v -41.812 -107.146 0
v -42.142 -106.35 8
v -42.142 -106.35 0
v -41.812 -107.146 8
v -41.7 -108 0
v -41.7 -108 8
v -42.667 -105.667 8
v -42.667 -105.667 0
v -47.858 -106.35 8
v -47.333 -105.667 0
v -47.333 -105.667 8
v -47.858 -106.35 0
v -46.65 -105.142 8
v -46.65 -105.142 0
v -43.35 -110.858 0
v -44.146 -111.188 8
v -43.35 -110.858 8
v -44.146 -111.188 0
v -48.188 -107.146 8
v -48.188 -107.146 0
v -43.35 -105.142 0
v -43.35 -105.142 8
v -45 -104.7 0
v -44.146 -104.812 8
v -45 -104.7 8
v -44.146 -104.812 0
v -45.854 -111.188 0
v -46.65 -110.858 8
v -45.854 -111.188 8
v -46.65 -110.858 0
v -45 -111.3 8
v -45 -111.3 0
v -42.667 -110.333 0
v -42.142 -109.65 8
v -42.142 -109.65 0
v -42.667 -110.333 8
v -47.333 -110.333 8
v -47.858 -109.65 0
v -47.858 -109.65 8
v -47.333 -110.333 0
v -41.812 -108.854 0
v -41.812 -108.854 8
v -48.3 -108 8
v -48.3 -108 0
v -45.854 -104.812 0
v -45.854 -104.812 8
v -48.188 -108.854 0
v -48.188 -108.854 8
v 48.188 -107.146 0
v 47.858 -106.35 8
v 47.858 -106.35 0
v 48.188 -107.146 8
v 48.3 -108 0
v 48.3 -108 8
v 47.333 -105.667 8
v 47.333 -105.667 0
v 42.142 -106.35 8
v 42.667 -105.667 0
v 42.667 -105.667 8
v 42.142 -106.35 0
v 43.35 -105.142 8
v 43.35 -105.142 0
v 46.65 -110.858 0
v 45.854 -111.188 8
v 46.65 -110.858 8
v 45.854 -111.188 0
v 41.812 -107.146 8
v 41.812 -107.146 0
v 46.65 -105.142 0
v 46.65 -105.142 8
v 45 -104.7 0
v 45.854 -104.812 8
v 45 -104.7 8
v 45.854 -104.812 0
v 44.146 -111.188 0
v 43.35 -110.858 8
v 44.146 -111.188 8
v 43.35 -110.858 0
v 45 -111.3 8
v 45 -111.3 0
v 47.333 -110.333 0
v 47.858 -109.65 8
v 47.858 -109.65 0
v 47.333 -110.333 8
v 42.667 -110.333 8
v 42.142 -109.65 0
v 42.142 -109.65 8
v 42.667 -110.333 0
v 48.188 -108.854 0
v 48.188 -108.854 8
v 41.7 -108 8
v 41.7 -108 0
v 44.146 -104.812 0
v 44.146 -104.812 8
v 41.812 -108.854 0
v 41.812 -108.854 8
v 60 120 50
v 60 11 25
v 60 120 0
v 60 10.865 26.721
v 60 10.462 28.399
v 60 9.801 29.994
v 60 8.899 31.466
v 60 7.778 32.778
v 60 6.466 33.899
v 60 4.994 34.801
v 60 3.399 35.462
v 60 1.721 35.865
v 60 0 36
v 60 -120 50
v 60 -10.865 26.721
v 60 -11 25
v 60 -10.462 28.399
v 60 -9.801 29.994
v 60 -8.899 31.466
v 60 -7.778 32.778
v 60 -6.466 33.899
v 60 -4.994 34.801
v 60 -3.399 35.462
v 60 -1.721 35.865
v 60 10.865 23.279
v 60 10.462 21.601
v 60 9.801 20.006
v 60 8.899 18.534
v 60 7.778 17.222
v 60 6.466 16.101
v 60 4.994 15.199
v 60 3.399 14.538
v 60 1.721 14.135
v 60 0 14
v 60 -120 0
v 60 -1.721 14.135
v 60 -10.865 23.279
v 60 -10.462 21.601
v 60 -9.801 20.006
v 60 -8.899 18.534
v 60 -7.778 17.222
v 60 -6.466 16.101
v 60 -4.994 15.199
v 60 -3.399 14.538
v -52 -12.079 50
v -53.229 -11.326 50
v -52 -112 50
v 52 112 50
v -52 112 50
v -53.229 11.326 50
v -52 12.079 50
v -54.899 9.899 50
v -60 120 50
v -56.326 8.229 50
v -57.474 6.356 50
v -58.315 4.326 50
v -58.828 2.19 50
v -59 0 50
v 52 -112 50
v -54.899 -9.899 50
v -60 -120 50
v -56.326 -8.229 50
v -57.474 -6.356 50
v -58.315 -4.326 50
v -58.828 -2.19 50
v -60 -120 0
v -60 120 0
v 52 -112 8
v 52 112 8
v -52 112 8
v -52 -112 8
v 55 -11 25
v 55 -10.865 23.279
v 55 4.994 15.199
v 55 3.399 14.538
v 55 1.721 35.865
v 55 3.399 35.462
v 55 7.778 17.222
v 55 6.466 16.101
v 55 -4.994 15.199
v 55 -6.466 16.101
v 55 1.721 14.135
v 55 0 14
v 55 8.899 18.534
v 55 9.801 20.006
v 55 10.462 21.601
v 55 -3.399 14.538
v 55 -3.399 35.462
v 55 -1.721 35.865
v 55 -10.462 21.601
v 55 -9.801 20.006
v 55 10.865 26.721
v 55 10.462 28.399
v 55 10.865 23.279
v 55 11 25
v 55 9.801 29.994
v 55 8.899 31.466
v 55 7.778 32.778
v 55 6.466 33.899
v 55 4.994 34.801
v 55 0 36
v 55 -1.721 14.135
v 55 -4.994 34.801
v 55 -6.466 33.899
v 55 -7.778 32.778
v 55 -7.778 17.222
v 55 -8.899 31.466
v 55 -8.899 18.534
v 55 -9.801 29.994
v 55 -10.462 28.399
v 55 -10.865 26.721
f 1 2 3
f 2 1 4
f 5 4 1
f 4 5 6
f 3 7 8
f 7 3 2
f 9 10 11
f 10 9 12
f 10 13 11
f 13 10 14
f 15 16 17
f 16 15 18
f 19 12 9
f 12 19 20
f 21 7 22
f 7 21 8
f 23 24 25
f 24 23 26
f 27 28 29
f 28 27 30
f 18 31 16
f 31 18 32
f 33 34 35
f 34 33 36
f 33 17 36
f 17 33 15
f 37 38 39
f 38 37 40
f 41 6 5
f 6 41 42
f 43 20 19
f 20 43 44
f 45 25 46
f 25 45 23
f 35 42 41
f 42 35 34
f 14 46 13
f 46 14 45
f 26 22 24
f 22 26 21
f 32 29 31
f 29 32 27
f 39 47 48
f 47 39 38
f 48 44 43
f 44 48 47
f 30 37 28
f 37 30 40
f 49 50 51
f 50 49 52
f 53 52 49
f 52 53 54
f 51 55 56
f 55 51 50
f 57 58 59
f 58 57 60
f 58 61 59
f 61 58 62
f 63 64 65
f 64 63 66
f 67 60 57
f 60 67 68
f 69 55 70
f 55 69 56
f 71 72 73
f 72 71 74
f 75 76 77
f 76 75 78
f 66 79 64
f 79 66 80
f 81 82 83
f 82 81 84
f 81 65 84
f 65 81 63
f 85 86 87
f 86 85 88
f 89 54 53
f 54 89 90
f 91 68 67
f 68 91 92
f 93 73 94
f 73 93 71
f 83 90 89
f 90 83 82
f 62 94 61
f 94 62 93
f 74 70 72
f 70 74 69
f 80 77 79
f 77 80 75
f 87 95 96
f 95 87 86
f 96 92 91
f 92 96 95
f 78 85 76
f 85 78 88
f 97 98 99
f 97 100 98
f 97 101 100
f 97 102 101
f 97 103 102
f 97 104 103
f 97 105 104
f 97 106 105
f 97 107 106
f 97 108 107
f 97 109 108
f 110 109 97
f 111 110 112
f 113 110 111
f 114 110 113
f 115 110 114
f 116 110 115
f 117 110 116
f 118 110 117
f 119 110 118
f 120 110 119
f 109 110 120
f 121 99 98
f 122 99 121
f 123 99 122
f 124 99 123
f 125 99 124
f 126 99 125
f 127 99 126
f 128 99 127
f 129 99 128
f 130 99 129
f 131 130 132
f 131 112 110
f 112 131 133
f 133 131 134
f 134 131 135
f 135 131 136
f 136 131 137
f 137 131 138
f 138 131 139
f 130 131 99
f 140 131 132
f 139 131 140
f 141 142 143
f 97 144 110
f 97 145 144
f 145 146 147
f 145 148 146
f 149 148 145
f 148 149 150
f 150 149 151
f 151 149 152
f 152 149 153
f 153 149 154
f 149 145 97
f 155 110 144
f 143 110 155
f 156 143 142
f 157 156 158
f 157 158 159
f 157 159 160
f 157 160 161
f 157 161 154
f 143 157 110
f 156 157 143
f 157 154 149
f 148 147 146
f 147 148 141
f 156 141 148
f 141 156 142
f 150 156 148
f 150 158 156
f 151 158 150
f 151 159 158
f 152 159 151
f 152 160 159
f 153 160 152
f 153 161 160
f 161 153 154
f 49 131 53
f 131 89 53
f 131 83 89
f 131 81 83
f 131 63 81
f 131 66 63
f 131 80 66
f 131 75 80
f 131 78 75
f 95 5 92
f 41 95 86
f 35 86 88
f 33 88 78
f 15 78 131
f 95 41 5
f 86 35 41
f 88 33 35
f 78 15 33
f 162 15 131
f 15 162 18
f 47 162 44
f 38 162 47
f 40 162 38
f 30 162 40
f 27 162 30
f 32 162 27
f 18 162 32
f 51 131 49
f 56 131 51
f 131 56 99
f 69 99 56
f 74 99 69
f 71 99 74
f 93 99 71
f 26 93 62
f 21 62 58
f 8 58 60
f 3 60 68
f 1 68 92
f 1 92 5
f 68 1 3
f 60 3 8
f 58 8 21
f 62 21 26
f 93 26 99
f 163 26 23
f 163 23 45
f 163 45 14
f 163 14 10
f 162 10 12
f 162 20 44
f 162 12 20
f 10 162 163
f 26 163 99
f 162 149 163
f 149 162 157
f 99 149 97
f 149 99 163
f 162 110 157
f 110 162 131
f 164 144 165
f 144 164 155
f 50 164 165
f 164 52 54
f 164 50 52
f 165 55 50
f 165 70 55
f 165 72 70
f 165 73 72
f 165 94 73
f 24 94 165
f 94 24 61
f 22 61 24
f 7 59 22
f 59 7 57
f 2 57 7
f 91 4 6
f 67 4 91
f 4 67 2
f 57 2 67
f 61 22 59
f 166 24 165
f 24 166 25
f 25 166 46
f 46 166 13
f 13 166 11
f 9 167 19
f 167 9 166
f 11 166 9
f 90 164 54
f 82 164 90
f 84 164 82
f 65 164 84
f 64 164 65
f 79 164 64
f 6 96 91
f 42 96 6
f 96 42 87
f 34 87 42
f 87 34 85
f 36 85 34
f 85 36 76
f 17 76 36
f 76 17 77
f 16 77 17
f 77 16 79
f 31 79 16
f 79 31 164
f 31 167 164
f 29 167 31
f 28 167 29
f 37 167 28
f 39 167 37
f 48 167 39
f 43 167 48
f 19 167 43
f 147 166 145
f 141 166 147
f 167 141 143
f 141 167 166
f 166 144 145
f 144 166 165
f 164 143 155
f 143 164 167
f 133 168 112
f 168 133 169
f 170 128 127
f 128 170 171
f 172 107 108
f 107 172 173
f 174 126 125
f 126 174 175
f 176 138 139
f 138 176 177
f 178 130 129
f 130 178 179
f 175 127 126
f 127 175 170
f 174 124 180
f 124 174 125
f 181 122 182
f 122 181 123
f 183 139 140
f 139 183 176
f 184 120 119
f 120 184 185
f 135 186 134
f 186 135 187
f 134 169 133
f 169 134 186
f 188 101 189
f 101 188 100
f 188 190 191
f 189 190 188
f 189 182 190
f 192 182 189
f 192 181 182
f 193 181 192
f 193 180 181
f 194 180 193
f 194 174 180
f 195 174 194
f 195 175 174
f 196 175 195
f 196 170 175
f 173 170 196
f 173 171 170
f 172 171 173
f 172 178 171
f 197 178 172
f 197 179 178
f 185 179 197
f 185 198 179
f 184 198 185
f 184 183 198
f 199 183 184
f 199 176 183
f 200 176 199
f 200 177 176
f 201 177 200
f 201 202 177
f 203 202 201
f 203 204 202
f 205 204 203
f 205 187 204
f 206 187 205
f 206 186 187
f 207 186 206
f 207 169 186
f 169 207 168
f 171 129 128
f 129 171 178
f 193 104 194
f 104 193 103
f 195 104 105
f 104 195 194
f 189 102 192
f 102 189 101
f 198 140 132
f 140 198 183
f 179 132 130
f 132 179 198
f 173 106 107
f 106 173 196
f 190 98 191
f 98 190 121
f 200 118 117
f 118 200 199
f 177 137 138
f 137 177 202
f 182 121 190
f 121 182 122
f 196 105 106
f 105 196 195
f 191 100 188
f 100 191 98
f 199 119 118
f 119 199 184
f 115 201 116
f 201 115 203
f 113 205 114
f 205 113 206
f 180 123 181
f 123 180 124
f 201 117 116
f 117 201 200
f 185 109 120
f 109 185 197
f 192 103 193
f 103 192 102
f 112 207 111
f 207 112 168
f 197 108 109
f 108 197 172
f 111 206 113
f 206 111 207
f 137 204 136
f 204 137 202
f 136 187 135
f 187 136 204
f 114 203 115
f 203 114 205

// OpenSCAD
// file: lib/utils.scad
// Shared utilities for CHORUS-SGH-1 OpenSCAD

module flanged_port(od=16, length=25, flange_od=40, flange_t=6) {
    translate([0, 0, -length])
        cylinder(h=length, d=od, $fn=32);
    cylinder(h=flange_t, d=flange_od, $fn=48);
}

module o_ring_groove(dia, depth=2.2, width=3.0) {
    rotate_extrude($fn=64)
        translate([dia/2 - depth, 0])
            square([depth, width], center=true);
}

module bolt_hole(d=6.6, h=50) {
    cylinder(h=h, d=d, $fn=24);
}

module bolt_circle_pattern(n, radius, d=6.6, h=50) {
    for (i = [0:n-1]) {
        ang = 360 * i / n;
        rotate([0, 0, ang])
            translate([radius, 0, 0])
                bolt_hole(d=d, h=h);
    }
}

module plate_frame(w, h, t, corner_r=8) {
    linear_extrude(t)
        offset(r=corner_r)
            square([w - 2*corner_r, h - 2*corner_r], center=true);
}
// file: lib/generated_constants.scad
// AUTO-GENERATED from simulation/sizing.py — do not hand edit
P_target_W = 10.0;
A_mem_m2 = 0.72;
active_w = 200.0;
active_h = 300.0;
n_plates = 12;
housing_od = 280.0;
housing_len = 264;
bolt_circle = 240.0;
frame_L = 664;
frame_W = 480.0;
frame_H = 900;
delta_P_bar = 34.58;
plate_pitch = 12;
// main file
// CHORUS-SGH-1 — low-salinity feed manifold
include <lib/generated_constants.scad>
include <lib/utils.scad>

module feed_manifold() {
    body_l = 120;
    body_w = active_w + 40;
    body_h = 50;
    difference() {
        translate([-body_l/2, -body_w/2, 0])
            cube([body_l, body_w, body_h]);
        // internal plenum
        translate([-body_l/2 + 8, -body_w/2 + 8, 8])
            cube([body_l-16, body_w-16, body_h]);
        // outlet to housing
        translate([body_l/2 - 5, 0, body_h/2])
            rotate([0, 90, 0])
                cylinder(h=30, d=22, $fn=40);
        // inlet (NPT representation)
        translate([-body_l/2 + 15, 0, body_h])
            cylinder(h=25, d=28, $fn=40);
        // conductivity sensor port
        translate([0, body_w/2 - 10, body_h/2])
            rotate([90, 0, 0])
                cylinder(h=20, d=12, $fn=24);
        // mounting
        for (x = [-body_l/2+15, body_l/2-15])
            translate([x, -body_w/2+12, -1])
                bolt_hole(d=6.6, h=body_h+10);
    }
}

module sgh1_manifold_feed_part() { feed_manifold(); }
sgh1_manifold_feed_part();
